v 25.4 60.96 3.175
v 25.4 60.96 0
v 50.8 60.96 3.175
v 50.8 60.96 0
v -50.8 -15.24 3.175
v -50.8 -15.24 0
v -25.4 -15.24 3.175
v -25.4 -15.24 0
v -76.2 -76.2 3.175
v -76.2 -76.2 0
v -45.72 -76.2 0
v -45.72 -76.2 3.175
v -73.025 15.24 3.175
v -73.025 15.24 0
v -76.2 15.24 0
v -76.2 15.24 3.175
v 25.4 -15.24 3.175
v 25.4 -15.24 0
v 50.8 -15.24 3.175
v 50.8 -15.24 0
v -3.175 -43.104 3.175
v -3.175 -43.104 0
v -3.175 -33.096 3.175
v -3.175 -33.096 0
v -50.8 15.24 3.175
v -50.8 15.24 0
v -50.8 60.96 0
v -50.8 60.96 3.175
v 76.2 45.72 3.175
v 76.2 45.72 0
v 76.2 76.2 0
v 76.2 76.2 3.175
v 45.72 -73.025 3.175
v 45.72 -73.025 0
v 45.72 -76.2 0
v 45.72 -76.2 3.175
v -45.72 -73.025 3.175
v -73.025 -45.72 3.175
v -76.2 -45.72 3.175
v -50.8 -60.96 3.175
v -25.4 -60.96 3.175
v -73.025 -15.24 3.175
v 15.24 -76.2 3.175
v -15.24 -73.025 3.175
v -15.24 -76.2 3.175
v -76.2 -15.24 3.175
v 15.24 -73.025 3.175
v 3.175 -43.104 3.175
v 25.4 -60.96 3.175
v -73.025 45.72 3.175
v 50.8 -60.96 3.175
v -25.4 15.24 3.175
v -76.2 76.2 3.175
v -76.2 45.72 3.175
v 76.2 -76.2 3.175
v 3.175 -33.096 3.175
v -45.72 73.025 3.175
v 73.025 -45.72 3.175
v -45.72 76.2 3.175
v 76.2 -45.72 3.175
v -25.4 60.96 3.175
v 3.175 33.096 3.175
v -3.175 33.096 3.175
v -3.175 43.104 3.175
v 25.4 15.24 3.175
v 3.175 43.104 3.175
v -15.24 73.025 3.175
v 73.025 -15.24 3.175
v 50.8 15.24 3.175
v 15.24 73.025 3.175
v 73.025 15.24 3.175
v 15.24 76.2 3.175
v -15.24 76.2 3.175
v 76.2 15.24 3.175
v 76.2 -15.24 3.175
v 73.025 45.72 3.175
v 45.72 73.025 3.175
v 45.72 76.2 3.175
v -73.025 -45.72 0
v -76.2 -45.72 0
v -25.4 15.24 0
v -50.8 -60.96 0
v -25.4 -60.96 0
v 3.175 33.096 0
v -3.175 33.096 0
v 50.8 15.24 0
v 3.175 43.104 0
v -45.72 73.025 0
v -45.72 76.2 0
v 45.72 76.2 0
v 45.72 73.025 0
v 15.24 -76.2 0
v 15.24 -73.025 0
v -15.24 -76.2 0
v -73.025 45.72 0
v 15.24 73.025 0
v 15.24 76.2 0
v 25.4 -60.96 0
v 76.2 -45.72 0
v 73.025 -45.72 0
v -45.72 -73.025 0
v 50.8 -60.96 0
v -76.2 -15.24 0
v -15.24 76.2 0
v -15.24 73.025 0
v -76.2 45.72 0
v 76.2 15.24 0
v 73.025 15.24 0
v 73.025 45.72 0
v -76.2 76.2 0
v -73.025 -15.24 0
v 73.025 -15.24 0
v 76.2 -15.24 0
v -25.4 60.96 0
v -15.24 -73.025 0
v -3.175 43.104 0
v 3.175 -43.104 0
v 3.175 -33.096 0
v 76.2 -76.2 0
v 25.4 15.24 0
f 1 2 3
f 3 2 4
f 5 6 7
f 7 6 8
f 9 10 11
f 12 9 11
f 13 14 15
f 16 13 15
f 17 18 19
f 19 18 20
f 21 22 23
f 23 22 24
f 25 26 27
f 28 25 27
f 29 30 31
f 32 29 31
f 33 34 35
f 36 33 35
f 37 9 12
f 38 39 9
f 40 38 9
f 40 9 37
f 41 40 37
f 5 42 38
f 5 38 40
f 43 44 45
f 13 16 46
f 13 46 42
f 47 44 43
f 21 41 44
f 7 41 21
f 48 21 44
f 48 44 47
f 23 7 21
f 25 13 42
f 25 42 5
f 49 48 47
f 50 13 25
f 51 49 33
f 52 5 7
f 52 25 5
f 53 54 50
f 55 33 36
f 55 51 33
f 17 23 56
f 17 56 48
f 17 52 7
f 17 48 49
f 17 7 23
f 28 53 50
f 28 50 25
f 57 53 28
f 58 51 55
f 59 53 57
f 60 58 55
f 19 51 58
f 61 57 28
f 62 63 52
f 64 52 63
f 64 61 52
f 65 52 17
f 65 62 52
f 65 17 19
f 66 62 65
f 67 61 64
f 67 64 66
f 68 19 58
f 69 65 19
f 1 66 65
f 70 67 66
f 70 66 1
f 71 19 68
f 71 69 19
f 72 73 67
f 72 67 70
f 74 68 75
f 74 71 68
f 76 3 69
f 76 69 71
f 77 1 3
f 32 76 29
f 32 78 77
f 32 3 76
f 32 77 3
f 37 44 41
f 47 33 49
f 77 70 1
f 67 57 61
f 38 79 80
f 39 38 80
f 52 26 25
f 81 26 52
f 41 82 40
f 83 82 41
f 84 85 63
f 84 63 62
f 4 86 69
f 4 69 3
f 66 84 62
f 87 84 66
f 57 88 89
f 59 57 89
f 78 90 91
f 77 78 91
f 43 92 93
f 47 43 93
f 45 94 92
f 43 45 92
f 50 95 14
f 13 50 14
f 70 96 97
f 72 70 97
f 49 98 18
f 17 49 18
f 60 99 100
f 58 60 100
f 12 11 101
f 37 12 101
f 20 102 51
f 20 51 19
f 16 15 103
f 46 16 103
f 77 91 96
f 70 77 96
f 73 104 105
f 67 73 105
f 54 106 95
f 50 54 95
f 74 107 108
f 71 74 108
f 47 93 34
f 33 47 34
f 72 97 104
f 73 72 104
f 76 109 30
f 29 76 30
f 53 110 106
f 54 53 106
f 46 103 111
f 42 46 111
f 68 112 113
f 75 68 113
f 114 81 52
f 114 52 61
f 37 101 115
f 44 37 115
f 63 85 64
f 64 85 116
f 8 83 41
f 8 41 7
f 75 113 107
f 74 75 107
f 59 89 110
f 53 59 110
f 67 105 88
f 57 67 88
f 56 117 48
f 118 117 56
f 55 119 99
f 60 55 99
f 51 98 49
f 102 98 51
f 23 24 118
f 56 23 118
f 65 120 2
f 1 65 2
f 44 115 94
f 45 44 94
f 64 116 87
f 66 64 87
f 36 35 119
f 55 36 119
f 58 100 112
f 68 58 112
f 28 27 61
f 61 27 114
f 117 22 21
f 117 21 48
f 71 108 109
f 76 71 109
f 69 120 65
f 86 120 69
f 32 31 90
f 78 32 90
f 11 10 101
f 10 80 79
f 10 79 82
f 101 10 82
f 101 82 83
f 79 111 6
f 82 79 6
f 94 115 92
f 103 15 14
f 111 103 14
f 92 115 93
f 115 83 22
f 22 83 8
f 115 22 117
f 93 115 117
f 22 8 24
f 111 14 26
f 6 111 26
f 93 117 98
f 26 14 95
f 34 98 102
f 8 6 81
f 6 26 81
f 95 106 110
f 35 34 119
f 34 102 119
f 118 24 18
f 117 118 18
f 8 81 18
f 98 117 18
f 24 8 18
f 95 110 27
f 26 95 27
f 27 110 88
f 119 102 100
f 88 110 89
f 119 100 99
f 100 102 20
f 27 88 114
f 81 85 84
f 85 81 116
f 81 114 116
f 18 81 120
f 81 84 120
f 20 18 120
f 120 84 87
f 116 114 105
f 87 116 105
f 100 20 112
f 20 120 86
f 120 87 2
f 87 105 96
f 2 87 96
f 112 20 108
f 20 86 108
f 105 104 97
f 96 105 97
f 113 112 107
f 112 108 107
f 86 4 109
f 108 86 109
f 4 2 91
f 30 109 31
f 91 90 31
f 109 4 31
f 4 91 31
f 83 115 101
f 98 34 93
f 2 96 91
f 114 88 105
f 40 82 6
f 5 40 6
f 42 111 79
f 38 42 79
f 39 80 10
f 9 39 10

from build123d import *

# Parameters (mm, degrees)
F0_W     = 25.4
F0_H     = 45.72
F0_W_2   = 6.35
F0_H_2   = 10.0076
F1_DEPTH = 3.175


with BuildPart() as f1:
    # F0 (on Top) → F1 (new body)
    with BuildSketch(Plane.XY):
        Polygon((-45.72, 76.2), (-76.2, 76.2), (-76.2, 45.72), (-73.025, 45.72), (-73.025, 15.24), (-76.2, 15.24), (-76.2, -15.24), (-73.025, -15.24), (-73.025, -45.72), (-76.2, -45.72), (-76.2, -76.2), (-45.72, -76.2), (-45.72, -73.025), (-15.24, -73.025), (-15.24, -76.2), (15.24, -76.2), (15.24, -73.025), (45.72, -73.025), (45.72, -76.2), (76.2, -76.2), (76.2, -45.72), (73.025, -45.72), (73.025, -15.24), (76.2, -15.24), (76.2, 15.24), (73.025, 15.24), (73.025, 45.72), (76.2, 45.72), (76.2, 76.2), (45.72, 76.2), (45.72, 73.025), (15.24, 73.025), (15.24, 76.2), (-15.24, 76.2), (-15.24, 73.025), (-45.72, 73.025), align=None)
        with Locations((-38.1, -38.1)):
            Rectangle(F0_W, F0_H, mode=Mode.SUBTRACT)
        with Locations((0, -38.1)):
            Rectangle(F0_W_2, F0_H_2, mode=Mode.SUBTRACT)
        with Locations((38.1, -38.1)):
            Rectangle(F0_W, F0_H, mode=Mode.SUBTRACT)
        with Locations((-38.1, 38.1)):
            Rectangle(F0_W, F0_H, mode=Mode.SUBTRACT)
        with Locations((0, 38.1)):
            Rectangle(F0_W_2, F0_H_2, mode=Mode.SUBTRACT)
        with Locations((38.1, 38.1)):
            Rectangle(F0_W, F0_H, mode=Mode.SUBTRACT)
    extrude(amount=F1_DEPTH)


solid = f1.part
